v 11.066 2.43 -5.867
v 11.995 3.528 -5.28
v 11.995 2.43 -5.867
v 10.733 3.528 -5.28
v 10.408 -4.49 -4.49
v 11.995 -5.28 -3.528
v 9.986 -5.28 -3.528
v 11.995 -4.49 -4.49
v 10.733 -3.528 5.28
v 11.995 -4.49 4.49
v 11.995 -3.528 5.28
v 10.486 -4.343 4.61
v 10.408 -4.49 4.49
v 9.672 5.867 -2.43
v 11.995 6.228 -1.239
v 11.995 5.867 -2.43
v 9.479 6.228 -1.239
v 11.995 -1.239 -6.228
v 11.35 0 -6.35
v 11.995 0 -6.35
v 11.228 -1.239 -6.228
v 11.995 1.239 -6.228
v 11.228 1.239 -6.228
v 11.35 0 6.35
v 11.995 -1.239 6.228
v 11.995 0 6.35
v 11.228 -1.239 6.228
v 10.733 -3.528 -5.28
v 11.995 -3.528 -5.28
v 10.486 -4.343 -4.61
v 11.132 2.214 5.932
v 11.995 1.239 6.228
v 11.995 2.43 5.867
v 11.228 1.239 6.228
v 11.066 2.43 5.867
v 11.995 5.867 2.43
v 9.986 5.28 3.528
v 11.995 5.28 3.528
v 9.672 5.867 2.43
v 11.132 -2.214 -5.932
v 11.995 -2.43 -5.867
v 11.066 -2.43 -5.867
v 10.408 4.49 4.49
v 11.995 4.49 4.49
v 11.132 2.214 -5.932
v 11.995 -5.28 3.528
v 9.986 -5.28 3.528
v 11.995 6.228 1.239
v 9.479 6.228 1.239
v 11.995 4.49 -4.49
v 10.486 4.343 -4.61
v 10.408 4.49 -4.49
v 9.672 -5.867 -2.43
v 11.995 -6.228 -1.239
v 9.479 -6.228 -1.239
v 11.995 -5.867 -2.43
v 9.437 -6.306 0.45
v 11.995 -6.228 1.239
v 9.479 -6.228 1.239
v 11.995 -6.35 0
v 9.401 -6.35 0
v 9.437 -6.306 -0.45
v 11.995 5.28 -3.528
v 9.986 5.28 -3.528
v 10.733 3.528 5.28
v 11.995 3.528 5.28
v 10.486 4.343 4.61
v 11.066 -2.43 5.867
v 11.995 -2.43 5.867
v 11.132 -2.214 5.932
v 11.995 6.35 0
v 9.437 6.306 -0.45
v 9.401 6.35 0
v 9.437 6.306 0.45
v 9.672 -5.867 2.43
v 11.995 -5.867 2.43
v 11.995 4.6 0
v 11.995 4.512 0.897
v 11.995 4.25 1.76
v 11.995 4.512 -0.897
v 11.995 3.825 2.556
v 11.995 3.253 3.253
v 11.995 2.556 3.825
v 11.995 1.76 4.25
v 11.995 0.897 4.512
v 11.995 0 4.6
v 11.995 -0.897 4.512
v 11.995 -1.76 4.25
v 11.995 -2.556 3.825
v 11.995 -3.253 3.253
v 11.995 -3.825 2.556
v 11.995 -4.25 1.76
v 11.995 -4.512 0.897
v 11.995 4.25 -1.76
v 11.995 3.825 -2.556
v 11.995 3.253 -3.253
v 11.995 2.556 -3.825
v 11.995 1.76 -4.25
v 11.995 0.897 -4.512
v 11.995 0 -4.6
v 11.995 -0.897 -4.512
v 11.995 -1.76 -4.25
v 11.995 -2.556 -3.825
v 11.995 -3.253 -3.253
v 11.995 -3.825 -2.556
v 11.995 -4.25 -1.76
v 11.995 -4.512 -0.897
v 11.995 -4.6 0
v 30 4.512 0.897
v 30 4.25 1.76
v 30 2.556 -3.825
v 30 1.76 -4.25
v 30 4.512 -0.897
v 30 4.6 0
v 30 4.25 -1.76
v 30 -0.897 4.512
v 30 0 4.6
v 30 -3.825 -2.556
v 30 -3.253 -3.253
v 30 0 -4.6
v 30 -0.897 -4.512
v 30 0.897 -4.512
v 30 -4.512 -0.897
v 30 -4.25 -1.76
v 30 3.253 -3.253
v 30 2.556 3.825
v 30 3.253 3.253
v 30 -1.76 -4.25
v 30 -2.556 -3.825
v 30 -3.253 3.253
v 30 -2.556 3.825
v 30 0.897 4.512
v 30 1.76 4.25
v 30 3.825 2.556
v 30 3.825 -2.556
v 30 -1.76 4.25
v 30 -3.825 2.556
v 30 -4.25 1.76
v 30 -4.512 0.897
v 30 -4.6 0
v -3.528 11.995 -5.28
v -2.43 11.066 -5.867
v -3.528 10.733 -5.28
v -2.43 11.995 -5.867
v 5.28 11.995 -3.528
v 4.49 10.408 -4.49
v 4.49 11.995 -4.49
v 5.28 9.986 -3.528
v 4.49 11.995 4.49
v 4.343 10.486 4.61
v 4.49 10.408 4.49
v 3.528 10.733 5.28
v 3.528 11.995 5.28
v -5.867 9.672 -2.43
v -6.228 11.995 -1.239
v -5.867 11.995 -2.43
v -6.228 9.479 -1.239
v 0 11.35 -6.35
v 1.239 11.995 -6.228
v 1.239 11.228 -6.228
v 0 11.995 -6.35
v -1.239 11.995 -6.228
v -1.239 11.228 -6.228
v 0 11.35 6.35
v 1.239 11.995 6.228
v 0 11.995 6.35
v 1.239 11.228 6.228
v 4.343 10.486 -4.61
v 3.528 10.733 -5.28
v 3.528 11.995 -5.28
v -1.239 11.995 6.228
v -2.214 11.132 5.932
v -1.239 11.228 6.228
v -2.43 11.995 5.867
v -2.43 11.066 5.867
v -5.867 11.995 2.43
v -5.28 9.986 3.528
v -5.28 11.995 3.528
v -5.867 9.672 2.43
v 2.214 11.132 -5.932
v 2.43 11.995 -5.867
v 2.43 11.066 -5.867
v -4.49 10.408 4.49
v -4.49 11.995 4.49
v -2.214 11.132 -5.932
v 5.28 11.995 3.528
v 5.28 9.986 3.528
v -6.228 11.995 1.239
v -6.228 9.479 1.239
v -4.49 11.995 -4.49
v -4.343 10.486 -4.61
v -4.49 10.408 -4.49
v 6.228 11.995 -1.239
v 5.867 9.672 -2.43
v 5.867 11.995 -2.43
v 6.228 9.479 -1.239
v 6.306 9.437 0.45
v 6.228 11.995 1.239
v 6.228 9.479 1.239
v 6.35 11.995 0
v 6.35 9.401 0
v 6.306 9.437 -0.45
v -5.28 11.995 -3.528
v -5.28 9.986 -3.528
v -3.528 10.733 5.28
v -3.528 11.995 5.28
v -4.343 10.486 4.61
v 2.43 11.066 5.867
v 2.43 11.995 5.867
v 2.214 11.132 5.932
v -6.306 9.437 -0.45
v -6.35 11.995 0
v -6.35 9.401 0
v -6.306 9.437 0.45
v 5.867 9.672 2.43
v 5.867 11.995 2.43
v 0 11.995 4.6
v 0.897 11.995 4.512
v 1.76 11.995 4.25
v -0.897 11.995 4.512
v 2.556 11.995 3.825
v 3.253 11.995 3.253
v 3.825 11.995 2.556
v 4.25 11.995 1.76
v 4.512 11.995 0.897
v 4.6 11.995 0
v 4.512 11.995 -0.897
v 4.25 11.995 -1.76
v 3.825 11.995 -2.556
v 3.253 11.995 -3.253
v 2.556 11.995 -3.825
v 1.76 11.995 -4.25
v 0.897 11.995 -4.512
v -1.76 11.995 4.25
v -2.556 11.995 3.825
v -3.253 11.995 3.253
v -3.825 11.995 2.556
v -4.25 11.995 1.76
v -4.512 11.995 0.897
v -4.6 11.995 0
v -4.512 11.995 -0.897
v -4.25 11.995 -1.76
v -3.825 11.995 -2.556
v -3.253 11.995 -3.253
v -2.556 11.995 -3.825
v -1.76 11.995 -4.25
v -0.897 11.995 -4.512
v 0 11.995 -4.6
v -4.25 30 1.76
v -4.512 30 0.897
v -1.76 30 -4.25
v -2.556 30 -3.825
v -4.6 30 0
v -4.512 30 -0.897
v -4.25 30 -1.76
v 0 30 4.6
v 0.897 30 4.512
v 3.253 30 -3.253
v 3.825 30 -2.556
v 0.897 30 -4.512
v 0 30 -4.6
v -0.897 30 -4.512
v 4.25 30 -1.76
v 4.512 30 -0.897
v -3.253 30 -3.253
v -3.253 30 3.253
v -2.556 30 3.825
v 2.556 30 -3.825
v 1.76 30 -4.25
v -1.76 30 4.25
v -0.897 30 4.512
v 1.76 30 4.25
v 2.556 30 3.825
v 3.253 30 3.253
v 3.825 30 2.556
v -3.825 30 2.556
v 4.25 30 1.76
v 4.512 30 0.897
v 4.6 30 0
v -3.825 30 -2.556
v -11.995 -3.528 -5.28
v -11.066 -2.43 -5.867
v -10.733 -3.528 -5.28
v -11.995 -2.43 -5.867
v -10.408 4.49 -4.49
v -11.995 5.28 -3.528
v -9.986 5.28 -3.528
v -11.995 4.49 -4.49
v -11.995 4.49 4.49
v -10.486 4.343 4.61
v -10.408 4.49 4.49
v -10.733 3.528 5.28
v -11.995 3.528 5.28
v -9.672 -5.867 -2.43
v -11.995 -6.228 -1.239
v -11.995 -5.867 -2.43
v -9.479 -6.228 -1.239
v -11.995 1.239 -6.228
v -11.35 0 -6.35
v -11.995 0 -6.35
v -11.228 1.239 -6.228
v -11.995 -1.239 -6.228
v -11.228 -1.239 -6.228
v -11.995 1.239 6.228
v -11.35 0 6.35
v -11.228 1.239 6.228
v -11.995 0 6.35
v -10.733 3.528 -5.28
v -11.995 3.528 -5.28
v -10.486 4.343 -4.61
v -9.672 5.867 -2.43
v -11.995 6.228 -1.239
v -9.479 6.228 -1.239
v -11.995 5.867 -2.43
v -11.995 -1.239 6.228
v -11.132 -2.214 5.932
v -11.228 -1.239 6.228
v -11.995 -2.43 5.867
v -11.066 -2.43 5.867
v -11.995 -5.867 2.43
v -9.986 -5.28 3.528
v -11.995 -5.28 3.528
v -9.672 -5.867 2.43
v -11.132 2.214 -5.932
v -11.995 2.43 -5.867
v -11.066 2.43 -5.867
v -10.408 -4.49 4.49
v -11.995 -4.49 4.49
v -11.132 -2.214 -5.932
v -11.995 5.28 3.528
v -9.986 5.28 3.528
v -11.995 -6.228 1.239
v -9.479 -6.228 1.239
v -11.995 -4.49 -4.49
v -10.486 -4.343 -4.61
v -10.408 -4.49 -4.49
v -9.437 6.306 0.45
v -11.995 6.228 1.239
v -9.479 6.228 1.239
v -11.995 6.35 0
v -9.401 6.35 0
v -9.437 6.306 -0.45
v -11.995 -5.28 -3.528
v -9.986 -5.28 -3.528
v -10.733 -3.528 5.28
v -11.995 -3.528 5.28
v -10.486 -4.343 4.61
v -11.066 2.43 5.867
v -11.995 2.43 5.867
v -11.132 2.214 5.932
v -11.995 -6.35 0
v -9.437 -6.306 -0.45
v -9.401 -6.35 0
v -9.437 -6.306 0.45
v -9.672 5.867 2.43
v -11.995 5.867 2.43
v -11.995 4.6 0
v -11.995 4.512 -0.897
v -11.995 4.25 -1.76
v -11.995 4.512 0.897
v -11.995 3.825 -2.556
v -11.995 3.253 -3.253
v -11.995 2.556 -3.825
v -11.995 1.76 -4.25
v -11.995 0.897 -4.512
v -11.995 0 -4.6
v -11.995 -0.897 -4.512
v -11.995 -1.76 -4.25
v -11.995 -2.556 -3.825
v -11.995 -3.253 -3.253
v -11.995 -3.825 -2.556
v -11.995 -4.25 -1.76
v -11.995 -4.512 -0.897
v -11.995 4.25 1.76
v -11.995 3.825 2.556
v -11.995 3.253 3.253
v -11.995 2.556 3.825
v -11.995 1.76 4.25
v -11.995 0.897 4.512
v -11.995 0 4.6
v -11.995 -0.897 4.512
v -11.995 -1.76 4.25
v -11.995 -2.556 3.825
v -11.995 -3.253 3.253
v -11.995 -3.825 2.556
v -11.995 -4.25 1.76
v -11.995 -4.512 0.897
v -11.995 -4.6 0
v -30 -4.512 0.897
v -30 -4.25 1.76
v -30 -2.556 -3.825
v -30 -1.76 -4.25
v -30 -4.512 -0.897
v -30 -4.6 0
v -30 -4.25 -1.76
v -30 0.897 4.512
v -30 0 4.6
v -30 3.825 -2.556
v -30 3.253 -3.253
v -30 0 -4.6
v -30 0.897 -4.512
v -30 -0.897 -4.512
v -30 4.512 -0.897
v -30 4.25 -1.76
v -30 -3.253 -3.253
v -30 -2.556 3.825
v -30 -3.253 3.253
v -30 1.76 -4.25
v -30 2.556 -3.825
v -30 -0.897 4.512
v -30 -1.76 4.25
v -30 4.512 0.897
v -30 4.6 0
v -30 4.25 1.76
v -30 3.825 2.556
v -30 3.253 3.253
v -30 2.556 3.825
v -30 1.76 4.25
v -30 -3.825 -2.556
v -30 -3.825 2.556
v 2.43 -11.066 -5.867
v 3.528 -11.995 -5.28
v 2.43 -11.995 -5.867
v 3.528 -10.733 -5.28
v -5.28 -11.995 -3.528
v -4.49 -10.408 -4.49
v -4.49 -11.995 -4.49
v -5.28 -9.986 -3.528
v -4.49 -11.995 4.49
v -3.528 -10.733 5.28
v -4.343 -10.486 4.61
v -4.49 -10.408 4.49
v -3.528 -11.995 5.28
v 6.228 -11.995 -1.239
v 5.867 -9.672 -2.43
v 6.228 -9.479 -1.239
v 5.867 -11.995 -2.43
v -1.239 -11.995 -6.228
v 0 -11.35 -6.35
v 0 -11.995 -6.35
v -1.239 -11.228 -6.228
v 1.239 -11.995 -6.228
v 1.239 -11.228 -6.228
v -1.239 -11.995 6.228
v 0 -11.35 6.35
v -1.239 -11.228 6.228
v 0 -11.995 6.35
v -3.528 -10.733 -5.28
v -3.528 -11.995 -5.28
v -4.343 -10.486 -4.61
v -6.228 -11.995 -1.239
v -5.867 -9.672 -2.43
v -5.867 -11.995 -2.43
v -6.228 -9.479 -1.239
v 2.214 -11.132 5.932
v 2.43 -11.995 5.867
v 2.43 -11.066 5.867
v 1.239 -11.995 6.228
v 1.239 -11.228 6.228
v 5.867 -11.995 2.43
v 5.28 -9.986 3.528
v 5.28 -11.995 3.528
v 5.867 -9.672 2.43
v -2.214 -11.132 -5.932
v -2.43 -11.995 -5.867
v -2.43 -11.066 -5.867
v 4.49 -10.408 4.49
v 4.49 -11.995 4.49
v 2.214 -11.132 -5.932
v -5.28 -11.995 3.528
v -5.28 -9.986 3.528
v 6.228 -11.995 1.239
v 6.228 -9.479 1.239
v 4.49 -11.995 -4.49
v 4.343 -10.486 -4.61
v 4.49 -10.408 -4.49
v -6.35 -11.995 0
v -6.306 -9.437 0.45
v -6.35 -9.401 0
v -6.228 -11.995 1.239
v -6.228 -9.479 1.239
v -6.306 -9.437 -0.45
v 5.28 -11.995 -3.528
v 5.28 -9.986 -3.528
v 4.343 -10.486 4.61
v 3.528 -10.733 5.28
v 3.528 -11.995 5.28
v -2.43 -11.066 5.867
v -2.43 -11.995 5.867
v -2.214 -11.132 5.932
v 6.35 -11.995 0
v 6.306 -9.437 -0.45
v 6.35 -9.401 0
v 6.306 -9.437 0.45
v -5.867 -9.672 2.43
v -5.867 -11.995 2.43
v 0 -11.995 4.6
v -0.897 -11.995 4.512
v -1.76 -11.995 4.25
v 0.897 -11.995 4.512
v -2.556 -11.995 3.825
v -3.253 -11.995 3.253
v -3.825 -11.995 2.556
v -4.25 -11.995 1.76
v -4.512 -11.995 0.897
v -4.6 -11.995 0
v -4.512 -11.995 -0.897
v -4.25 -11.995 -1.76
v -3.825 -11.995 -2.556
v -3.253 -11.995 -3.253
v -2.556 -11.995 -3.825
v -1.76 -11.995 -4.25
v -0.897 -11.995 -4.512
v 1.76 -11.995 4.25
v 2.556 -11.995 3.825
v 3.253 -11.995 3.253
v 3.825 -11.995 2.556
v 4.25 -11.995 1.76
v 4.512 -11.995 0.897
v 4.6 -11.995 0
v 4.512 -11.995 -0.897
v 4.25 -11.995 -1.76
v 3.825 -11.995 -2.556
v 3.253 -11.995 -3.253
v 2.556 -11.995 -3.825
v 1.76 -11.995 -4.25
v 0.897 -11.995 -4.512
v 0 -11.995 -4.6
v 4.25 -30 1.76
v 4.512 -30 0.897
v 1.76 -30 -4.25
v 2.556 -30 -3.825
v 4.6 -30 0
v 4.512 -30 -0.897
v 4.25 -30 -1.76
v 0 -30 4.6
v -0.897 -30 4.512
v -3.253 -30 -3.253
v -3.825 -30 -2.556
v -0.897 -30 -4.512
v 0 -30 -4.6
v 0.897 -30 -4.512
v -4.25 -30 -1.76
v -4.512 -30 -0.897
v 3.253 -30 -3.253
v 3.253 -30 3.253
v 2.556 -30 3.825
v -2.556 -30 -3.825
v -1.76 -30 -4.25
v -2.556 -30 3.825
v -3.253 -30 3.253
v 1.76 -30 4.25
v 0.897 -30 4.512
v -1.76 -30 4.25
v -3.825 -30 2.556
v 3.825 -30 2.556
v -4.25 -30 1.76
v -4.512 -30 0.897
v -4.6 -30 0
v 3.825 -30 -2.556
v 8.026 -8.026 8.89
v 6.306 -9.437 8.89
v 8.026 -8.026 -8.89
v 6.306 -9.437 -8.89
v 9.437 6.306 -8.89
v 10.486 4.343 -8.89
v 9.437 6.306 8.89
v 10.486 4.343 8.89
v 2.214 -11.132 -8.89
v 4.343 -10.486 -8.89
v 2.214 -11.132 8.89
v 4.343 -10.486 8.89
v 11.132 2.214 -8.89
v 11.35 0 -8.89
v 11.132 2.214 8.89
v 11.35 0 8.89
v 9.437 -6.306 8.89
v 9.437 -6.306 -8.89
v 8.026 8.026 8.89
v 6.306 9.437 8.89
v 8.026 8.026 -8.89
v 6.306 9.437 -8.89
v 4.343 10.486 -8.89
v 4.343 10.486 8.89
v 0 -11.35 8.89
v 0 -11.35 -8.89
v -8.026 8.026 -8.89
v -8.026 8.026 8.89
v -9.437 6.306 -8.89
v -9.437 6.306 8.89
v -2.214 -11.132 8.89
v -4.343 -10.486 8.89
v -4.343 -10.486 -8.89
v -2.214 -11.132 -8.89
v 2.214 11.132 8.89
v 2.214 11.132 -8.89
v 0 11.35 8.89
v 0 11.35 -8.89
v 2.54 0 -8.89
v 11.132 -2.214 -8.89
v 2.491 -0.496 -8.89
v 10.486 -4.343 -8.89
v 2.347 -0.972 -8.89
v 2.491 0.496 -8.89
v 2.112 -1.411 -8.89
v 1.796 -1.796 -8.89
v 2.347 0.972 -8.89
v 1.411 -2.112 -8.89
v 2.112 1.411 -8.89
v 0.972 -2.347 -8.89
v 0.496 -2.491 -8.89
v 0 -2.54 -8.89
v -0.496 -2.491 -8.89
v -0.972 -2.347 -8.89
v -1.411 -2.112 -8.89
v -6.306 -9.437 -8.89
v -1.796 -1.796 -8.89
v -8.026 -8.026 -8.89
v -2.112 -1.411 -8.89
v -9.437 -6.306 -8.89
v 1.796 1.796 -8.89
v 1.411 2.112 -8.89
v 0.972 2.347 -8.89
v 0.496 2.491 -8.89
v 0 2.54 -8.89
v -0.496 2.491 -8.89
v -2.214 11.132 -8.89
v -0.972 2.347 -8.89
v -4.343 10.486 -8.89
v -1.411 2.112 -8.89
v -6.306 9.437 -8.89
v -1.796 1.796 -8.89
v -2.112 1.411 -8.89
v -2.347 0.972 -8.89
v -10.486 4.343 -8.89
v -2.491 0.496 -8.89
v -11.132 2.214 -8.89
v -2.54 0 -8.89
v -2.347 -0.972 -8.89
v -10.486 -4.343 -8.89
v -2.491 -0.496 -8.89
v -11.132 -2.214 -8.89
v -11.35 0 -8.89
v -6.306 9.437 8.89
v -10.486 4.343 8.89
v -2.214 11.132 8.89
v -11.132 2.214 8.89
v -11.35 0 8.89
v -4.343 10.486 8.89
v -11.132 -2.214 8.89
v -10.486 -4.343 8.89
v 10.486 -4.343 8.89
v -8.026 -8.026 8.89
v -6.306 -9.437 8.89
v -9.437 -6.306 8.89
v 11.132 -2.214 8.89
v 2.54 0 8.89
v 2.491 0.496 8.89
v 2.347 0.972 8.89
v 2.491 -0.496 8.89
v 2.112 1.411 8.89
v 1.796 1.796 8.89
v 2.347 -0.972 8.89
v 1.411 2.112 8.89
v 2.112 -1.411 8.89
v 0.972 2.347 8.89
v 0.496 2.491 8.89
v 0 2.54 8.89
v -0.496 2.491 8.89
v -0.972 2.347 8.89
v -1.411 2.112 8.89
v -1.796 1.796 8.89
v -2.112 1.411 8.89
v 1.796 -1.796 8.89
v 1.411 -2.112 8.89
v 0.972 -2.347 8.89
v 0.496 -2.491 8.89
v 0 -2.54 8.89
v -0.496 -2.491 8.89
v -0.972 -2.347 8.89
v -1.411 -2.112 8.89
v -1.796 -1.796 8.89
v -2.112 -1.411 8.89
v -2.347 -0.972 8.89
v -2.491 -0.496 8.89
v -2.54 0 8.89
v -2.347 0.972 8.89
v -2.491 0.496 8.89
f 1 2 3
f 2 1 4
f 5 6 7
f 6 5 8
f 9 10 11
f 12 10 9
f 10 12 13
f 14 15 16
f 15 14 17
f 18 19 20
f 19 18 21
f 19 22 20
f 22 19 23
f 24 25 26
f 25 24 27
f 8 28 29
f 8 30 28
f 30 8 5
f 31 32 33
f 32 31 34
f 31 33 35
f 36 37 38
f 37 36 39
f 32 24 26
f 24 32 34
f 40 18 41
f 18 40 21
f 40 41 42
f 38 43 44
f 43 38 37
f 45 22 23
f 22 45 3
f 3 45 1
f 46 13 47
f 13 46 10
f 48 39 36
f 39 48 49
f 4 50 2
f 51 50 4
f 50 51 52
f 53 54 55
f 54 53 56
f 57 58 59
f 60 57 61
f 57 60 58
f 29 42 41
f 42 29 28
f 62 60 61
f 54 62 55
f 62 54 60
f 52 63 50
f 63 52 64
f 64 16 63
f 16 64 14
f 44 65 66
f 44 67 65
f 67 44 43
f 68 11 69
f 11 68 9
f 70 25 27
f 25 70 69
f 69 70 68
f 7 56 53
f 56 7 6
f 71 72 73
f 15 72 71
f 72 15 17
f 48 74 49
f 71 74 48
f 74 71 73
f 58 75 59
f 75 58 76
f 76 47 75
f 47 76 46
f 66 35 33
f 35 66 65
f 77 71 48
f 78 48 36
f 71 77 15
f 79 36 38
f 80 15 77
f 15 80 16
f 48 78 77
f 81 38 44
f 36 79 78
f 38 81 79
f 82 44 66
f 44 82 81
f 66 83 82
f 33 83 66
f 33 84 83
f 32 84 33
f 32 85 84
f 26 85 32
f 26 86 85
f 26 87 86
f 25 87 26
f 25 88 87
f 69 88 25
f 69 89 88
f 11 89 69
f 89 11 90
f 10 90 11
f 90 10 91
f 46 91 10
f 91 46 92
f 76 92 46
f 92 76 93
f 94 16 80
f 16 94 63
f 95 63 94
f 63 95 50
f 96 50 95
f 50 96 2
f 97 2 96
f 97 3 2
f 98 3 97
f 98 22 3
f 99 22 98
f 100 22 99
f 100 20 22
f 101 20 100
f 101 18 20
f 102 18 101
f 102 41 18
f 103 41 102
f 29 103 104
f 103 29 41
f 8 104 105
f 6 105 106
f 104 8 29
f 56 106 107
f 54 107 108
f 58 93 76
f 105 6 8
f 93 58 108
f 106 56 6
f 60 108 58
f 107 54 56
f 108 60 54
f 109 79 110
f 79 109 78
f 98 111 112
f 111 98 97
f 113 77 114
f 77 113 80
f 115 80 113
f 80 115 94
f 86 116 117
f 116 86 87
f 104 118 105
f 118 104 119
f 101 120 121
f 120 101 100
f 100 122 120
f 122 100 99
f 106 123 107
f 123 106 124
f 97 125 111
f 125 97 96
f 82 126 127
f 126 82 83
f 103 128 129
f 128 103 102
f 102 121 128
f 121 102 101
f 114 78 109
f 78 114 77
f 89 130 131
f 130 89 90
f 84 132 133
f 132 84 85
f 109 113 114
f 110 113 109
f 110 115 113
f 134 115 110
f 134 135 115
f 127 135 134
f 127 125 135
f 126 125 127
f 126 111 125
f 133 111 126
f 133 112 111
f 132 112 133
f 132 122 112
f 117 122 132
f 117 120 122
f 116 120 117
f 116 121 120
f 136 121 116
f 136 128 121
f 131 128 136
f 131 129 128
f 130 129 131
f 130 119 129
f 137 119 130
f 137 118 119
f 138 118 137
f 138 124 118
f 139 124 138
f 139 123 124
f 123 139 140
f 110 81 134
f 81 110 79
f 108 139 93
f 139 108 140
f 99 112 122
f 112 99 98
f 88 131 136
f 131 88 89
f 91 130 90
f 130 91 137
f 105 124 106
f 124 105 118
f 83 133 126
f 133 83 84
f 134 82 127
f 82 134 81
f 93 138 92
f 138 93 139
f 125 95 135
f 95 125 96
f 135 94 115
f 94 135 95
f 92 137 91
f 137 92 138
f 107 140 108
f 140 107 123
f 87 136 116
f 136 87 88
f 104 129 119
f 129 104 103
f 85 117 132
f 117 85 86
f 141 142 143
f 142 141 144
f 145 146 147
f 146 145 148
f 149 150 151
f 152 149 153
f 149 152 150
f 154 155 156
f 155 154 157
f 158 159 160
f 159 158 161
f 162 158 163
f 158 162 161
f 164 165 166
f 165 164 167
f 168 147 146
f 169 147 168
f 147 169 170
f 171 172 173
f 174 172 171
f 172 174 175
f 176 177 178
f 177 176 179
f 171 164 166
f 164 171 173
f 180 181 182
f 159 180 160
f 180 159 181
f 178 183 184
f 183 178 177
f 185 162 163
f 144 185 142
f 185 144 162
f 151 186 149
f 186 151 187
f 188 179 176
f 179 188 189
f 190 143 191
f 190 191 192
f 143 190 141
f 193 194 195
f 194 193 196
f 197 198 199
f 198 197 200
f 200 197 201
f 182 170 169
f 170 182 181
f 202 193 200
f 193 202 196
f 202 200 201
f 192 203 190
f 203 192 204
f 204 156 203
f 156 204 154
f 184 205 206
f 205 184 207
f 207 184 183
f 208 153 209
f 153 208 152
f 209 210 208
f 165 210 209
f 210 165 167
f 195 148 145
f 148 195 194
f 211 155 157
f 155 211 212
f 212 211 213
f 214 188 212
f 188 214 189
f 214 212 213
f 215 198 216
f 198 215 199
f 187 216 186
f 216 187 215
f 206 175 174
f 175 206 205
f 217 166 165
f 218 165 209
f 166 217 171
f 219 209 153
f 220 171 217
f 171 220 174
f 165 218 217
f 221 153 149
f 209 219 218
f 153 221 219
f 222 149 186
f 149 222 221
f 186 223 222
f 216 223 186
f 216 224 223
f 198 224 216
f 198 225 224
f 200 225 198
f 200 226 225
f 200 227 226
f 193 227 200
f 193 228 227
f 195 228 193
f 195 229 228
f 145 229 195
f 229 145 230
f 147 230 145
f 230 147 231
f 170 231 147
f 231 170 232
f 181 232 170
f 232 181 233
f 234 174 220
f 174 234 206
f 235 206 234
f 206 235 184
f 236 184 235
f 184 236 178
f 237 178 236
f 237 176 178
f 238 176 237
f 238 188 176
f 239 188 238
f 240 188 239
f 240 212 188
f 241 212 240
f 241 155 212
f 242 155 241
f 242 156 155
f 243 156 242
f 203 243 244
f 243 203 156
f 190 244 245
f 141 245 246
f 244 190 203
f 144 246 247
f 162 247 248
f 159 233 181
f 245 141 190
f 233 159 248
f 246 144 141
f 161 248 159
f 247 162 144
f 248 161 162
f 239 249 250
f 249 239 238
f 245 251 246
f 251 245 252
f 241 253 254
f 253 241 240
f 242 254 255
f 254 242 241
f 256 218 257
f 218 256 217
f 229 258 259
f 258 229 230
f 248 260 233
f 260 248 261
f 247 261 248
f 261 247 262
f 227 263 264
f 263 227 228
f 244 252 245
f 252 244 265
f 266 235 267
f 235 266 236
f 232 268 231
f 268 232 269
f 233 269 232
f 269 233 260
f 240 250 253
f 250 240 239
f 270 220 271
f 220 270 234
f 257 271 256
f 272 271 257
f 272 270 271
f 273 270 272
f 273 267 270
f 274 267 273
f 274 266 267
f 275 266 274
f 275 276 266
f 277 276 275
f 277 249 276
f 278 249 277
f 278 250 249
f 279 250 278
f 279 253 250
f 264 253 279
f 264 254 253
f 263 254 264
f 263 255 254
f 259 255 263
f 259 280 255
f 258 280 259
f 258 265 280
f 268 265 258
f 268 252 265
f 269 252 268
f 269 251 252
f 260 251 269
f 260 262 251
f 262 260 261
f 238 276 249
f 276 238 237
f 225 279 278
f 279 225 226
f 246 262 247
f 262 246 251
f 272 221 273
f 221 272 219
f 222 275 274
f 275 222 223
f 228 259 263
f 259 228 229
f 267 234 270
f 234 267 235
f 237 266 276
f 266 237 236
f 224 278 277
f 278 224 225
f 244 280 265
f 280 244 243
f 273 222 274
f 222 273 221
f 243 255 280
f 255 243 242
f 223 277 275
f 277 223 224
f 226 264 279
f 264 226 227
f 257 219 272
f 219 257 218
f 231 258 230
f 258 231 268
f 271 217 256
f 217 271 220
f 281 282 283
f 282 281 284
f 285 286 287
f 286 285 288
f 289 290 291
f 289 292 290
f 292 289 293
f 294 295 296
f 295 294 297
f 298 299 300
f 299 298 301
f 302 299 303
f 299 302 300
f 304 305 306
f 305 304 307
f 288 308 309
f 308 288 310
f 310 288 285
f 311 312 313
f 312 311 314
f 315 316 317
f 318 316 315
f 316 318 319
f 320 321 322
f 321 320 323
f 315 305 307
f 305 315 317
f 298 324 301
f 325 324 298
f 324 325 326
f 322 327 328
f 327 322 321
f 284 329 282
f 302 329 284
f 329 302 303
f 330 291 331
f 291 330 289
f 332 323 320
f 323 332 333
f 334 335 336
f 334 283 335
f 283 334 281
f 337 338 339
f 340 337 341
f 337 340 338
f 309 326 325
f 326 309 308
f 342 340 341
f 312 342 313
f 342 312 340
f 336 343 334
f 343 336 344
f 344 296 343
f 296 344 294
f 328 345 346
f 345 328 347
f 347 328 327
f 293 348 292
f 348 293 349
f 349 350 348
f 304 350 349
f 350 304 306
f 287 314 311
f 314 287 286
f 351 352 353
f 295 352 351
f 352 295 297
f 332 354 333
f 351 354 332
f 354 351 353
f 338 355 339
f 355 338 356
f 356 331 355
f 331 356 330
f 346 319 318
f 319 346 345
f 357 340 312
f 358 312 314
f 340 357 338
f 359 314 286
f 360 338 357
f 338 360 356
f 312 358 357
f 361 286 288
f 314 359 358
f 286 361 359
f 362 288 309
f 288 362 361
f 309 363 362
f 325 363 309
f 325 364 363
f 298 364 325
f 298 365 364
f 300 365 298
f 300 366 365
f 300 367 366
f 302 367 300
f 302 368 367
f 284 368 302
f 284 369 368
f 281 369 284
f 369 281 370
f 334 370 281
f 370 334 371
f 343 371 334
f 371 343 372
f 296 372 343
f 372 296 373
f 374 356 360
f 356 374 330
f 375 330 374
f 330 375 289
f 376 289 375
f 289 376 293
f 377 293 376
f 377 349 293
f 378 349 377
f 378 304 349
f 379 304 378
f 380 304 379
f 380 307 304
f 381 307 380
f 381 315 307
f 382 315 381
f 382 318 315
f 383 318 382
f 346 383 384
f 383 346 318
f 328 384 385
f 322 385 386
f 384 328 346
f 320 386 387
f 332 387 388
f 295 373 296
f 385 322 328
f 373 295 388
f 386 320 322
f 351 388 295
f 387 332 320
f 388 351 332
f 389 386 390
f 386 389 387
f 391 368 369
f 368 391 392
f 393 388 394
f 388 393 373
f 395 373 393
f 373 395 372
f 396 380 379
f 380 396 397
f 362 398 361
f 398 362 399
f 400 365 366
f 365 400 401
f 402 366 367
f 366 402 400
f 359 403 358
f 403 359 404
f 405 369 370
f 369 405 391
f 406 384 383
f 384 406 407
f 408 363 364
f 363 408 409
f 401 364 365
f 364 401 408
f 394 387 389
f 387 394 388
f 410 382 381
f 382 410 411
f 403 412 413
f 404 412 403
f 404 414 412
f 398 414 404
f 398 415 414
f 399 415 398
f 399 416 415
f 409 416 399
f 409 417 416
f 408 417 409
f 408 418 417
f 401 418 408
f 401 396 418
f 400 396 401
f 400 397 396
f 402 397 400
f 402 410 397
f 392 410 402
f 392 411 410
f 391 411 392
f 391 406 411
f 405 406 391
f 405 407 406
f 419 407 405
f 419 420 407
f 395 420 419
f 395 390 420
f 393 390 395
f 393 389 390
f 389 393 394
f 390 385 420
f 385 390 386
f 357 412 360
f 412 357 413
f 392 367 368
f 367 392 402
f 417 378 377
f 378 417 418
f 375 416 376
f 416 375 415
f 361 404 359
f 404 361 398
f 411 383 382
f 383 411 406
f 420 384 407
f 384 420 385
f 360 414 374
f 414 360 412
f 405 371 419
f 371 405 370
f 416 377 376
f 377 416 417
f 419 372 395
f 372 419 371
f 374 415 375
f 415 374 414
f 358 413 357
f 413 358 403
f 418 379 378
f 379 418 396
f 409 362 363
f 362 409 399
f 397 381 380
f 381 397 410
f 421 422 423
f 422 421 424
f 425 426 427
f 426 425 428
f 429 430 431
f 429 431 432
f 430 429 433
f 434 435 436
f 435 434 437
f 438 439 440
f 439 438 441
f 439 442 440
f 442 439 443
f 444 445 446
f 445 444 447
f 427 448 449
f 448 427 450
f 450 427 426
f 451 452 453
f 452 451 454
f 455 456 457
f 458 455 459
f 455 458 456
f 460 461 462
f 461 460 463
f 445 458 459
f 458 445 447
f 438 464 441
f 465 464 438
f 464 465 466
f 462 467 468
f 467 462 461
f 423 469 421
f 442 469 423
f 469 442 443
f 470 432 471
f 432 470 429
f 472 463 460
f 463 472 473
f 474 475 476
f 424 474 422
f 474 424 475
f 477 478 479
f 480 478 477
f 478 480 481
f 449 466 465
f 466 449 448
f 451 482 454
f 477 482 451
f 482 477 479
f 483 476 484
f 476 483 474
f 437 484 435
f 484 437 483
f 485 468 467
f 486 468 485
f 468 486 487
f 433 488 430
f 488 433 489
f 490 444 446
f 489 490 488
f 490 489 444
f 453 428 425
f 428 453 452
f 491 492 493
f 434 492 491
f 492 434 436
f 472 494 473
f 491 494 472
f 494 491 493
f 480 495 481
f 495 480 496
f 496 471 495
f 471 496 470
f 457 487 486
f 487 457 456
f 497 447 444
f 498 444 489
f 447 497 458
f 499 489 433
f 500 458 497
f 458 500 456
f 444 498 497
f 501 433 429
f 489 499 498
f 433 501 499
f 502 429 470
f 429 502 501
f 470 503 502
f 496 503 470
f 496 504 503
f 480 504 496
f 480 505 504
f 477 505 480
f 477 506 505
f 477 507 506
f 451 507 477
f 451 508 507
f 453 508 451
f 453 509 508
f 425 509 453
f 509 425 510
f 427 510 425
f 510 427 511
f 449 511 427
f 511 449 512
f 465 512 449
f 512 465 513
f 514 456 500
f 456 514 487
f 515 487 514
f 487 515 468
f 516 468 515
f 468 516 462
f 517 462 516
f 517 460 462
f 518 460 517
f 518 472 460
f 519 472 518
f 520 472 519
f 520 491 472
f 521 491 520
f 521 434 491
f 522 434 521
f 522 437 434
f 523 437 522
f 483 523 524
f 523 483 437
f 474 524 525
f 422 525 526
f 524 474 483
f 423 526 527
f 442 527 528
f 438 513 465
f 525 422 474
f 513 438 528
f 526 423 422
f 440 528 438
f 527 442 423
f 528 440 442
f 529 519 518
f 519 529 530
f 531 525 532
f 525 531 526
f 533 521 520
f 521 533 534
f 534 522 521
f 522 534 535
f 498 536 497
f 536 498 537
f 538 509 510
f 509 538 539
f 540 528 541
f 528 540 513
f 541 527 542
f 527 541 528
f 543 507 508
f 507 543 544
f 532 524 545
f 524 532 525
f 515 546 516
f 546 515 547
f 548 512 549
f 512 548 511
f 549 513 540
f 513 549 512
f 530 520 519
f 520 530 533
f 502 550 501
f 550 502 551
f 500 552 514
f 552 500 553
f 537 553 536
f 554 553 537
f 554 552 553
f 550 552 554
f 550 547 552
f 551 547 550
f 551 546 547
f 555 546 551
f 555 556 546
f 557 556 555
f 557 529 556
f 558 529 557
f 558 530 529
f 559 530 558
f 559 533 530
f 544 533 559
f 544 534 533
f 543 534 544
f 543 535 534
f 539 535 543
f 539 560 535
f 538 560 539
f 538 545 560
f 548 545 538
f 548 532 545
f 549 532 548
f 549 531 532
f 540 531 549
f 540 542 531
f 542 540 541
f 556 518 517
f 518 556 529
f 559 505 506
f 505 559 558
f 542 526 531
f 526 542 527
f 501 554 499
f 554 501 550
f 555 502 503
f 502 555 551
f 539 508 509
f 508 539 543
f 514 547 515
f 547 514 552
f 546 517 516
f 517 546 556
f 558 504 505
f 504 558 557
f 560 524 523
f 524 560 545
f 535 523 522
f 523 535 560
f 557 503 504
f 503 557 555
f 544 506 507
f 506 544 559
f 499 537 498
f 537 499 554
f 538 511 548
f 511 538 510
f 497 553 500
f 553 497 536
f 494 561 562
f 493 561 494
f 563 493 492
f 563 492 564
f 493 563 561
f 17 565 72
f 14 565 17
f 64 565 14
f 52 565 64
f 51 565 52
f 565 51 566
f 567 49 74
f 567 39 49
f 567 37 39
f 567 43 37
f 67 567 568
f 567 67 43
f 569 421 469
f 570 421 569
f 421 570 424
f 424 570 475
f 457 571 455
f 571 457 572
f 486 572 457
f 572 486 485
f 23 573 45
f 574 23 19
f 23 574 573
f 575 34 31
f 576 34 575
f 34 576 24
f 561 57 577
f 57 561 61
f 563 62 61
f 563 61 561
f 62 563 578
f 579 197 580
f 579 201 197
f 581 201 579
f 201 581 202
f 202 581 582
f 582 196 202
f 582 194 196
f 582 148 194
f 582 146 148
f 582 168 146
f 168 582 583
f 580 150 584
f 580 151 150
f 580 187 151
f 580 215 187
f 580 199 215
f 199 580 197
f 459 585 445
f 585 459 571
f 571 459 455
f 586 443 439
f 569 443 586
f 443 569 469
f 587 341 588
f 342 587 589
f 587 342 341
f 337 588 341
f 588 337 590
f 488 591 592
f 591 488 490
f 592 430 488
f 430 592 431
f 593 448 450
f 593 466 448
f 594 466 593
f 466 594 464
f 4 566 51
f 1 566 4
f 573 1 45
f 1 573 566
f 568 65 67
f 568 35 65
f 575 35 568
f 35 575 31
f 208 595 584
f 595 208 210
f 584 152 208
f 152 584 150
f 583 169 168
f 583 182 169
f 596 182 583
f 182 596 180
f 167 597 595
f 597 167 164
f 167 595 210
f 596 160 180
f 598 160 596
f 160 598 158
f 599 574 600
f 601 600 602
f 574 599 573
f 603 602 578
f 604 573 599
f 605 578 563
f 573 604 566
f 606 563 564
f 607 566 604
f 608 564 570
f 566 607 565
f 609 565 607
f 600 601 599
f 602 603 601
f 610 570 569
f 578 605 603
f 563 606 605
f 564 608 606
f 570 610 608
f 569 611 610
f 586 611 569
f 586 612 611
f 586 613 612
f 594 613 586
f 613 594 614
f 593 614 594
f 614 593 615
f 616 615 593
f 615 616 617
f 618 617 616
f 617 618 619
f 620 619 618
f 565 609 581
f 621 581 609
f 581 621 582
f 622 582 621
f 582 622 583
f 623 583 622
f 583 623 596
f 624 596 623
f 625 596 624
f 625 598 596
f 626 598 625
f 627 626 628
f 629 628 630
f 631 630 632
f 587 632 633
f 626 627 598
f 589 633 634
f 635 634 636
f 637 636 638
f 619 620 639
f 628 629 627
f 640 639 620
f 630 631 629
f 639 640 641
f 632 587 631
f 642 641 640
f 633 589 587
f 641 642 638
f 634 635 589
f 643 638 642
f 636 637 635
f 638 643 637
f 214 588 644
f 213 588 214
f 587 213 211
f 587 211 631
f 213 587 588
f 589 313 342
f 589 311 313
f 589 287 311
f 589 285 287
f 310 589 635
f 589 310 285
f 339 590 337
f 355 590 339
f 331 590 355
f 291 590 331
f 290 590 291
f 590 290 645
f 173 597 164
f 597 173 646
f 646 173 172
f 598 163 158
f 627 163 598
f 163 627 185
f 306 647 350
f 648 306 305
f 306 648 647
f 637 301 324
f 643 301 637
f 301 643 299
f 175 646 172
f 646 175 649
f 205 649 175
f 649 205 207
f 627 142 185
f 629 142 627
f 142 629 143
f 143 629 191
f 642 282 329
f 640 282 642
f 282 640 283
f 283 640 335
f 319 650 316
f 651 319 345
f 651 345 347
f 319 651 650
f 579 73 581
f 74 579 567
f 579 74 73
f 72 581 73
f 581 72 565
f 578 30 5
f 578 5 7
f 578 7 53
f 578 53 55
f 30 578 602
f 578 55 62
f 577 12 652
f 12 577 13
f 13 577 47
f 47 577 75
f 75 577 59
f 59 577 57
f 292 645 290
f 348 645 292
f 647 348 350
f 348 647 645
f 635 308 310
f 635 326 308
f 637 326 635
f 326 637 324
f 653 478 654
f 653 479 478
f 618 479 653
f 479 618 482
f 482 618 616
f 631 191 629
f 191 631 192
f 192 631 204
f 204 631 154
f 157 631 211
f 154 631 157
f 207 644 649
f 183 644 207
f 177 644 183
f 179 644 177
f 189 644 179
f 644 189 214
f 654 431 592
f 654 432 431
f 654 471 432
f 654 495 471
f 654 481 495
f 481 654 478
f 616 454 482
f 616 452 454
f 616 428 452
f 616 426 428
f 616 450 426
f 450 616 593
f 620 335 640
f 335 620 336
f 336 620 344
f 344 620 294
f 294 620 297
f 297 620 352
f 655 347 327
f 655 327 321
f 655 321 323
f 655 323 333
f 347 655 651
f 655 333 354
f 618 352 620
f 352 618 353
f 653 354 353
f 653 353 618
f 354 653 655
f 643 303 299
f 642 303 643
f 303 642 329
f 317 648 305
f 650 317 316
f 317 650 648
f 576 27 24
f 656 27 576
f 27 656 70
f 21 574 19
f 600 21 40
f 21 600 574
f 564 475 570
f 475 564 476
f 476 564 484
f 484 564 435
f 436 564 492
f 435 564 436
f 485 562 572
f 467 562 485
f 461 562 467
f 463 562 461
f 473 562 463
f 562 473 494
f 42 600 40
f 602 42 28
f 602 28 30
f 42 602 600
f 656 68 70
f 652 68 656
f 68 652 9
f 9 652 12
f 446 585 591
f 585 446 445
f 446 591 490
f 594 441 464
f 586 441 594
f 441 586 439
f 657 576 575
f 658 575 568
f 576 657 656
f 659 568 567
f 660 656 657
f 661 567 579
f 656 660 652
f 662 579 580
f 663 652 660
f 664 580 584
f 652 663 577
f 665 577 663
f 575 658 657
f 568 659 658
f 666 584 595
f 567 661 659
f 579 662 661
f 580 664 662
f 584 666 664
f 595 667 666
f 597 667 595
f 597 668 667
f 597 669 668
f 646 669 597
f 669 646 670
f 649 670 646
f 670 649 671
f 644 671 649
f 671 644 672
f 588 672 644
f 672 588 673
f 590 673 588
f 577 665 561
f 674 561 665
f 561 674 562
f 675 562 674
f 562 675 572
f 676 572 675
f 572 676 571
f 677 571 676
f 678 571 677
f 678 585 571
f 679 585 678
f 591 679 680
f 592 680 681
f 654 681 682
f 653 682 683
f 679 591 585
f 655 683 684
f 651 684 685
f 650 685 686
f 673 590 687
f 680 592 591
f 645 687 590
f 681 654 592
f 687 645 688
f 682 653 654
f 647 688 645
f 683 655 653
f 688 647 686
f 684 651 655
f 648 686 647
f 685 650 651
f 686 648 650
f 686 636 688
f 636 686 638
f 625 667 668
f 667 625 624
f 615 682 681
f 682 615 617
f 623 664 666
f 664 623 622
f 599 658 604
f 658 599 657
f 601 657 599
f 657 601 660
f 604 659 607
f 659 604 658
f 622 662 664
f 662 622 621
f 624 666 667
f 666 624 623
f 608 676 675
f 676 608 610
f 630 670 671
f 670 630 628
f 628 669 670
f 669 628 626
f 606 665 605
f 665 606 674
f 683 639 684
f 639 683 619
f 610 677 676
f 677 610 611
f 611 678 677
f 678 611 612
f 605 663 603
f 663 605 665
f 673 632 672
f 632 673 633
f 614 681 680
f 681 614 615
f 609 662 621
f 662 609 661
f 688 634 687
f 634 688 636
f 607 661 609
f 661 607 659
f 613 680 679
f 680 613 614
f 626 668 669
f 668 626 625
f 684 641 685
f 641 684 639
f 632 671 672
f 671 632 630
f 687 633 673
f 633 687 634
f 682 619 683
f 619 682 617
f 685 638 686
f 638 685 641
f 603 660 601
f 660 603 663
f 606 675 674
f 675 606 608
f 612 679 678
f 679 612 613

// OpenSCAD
$fn = 32;

// ----------------------------------------------------------------------
// Cardan cross: 60 mm span, 12.7 mm trunnions
// ----------------------------------------------------------------------

// --- parameters (mm) ---
journal_d = 12.7;         // trunnion diameter
arm_len = 30;             // trunnion length from the centre
step_r = 4.32;            // step position from the centre
step_d = 9.2;             // journal diameter after the step
hub_d = 22.7;             // hub diameter
hub_h = 17.78;            // hub height
bore_d = 5.08;            // hub bore

difference() {
  union() {
    /* hub along the joint axis */
    cylinder(h = hub_h, d = hub_d, center = true);
    for (a = [0 : 90 : 270]) rotate([0, 0, a]) {
      /* trunnion, sunk into the hub */
      translate([hub_d / 4, 0, 0]) rotate([0, 90, 0]) cylinder(h = step_r + 2, d = journal_d);
      /* stepped journal out to the tip */
      translate([step_r - 0.5, 0, 0]) rotate([0, 90, 0]) cylinder(h = arm_len + 0.5 - step_r, d = step_d);
    }
  }
  /* lubrication bore through the hub, 2.5 mm clear on both sides */
  translate([0, 0, -hub_h / 2 - 2.5]) cylinder(h = hub_h + 5, d = bore_d);
}
